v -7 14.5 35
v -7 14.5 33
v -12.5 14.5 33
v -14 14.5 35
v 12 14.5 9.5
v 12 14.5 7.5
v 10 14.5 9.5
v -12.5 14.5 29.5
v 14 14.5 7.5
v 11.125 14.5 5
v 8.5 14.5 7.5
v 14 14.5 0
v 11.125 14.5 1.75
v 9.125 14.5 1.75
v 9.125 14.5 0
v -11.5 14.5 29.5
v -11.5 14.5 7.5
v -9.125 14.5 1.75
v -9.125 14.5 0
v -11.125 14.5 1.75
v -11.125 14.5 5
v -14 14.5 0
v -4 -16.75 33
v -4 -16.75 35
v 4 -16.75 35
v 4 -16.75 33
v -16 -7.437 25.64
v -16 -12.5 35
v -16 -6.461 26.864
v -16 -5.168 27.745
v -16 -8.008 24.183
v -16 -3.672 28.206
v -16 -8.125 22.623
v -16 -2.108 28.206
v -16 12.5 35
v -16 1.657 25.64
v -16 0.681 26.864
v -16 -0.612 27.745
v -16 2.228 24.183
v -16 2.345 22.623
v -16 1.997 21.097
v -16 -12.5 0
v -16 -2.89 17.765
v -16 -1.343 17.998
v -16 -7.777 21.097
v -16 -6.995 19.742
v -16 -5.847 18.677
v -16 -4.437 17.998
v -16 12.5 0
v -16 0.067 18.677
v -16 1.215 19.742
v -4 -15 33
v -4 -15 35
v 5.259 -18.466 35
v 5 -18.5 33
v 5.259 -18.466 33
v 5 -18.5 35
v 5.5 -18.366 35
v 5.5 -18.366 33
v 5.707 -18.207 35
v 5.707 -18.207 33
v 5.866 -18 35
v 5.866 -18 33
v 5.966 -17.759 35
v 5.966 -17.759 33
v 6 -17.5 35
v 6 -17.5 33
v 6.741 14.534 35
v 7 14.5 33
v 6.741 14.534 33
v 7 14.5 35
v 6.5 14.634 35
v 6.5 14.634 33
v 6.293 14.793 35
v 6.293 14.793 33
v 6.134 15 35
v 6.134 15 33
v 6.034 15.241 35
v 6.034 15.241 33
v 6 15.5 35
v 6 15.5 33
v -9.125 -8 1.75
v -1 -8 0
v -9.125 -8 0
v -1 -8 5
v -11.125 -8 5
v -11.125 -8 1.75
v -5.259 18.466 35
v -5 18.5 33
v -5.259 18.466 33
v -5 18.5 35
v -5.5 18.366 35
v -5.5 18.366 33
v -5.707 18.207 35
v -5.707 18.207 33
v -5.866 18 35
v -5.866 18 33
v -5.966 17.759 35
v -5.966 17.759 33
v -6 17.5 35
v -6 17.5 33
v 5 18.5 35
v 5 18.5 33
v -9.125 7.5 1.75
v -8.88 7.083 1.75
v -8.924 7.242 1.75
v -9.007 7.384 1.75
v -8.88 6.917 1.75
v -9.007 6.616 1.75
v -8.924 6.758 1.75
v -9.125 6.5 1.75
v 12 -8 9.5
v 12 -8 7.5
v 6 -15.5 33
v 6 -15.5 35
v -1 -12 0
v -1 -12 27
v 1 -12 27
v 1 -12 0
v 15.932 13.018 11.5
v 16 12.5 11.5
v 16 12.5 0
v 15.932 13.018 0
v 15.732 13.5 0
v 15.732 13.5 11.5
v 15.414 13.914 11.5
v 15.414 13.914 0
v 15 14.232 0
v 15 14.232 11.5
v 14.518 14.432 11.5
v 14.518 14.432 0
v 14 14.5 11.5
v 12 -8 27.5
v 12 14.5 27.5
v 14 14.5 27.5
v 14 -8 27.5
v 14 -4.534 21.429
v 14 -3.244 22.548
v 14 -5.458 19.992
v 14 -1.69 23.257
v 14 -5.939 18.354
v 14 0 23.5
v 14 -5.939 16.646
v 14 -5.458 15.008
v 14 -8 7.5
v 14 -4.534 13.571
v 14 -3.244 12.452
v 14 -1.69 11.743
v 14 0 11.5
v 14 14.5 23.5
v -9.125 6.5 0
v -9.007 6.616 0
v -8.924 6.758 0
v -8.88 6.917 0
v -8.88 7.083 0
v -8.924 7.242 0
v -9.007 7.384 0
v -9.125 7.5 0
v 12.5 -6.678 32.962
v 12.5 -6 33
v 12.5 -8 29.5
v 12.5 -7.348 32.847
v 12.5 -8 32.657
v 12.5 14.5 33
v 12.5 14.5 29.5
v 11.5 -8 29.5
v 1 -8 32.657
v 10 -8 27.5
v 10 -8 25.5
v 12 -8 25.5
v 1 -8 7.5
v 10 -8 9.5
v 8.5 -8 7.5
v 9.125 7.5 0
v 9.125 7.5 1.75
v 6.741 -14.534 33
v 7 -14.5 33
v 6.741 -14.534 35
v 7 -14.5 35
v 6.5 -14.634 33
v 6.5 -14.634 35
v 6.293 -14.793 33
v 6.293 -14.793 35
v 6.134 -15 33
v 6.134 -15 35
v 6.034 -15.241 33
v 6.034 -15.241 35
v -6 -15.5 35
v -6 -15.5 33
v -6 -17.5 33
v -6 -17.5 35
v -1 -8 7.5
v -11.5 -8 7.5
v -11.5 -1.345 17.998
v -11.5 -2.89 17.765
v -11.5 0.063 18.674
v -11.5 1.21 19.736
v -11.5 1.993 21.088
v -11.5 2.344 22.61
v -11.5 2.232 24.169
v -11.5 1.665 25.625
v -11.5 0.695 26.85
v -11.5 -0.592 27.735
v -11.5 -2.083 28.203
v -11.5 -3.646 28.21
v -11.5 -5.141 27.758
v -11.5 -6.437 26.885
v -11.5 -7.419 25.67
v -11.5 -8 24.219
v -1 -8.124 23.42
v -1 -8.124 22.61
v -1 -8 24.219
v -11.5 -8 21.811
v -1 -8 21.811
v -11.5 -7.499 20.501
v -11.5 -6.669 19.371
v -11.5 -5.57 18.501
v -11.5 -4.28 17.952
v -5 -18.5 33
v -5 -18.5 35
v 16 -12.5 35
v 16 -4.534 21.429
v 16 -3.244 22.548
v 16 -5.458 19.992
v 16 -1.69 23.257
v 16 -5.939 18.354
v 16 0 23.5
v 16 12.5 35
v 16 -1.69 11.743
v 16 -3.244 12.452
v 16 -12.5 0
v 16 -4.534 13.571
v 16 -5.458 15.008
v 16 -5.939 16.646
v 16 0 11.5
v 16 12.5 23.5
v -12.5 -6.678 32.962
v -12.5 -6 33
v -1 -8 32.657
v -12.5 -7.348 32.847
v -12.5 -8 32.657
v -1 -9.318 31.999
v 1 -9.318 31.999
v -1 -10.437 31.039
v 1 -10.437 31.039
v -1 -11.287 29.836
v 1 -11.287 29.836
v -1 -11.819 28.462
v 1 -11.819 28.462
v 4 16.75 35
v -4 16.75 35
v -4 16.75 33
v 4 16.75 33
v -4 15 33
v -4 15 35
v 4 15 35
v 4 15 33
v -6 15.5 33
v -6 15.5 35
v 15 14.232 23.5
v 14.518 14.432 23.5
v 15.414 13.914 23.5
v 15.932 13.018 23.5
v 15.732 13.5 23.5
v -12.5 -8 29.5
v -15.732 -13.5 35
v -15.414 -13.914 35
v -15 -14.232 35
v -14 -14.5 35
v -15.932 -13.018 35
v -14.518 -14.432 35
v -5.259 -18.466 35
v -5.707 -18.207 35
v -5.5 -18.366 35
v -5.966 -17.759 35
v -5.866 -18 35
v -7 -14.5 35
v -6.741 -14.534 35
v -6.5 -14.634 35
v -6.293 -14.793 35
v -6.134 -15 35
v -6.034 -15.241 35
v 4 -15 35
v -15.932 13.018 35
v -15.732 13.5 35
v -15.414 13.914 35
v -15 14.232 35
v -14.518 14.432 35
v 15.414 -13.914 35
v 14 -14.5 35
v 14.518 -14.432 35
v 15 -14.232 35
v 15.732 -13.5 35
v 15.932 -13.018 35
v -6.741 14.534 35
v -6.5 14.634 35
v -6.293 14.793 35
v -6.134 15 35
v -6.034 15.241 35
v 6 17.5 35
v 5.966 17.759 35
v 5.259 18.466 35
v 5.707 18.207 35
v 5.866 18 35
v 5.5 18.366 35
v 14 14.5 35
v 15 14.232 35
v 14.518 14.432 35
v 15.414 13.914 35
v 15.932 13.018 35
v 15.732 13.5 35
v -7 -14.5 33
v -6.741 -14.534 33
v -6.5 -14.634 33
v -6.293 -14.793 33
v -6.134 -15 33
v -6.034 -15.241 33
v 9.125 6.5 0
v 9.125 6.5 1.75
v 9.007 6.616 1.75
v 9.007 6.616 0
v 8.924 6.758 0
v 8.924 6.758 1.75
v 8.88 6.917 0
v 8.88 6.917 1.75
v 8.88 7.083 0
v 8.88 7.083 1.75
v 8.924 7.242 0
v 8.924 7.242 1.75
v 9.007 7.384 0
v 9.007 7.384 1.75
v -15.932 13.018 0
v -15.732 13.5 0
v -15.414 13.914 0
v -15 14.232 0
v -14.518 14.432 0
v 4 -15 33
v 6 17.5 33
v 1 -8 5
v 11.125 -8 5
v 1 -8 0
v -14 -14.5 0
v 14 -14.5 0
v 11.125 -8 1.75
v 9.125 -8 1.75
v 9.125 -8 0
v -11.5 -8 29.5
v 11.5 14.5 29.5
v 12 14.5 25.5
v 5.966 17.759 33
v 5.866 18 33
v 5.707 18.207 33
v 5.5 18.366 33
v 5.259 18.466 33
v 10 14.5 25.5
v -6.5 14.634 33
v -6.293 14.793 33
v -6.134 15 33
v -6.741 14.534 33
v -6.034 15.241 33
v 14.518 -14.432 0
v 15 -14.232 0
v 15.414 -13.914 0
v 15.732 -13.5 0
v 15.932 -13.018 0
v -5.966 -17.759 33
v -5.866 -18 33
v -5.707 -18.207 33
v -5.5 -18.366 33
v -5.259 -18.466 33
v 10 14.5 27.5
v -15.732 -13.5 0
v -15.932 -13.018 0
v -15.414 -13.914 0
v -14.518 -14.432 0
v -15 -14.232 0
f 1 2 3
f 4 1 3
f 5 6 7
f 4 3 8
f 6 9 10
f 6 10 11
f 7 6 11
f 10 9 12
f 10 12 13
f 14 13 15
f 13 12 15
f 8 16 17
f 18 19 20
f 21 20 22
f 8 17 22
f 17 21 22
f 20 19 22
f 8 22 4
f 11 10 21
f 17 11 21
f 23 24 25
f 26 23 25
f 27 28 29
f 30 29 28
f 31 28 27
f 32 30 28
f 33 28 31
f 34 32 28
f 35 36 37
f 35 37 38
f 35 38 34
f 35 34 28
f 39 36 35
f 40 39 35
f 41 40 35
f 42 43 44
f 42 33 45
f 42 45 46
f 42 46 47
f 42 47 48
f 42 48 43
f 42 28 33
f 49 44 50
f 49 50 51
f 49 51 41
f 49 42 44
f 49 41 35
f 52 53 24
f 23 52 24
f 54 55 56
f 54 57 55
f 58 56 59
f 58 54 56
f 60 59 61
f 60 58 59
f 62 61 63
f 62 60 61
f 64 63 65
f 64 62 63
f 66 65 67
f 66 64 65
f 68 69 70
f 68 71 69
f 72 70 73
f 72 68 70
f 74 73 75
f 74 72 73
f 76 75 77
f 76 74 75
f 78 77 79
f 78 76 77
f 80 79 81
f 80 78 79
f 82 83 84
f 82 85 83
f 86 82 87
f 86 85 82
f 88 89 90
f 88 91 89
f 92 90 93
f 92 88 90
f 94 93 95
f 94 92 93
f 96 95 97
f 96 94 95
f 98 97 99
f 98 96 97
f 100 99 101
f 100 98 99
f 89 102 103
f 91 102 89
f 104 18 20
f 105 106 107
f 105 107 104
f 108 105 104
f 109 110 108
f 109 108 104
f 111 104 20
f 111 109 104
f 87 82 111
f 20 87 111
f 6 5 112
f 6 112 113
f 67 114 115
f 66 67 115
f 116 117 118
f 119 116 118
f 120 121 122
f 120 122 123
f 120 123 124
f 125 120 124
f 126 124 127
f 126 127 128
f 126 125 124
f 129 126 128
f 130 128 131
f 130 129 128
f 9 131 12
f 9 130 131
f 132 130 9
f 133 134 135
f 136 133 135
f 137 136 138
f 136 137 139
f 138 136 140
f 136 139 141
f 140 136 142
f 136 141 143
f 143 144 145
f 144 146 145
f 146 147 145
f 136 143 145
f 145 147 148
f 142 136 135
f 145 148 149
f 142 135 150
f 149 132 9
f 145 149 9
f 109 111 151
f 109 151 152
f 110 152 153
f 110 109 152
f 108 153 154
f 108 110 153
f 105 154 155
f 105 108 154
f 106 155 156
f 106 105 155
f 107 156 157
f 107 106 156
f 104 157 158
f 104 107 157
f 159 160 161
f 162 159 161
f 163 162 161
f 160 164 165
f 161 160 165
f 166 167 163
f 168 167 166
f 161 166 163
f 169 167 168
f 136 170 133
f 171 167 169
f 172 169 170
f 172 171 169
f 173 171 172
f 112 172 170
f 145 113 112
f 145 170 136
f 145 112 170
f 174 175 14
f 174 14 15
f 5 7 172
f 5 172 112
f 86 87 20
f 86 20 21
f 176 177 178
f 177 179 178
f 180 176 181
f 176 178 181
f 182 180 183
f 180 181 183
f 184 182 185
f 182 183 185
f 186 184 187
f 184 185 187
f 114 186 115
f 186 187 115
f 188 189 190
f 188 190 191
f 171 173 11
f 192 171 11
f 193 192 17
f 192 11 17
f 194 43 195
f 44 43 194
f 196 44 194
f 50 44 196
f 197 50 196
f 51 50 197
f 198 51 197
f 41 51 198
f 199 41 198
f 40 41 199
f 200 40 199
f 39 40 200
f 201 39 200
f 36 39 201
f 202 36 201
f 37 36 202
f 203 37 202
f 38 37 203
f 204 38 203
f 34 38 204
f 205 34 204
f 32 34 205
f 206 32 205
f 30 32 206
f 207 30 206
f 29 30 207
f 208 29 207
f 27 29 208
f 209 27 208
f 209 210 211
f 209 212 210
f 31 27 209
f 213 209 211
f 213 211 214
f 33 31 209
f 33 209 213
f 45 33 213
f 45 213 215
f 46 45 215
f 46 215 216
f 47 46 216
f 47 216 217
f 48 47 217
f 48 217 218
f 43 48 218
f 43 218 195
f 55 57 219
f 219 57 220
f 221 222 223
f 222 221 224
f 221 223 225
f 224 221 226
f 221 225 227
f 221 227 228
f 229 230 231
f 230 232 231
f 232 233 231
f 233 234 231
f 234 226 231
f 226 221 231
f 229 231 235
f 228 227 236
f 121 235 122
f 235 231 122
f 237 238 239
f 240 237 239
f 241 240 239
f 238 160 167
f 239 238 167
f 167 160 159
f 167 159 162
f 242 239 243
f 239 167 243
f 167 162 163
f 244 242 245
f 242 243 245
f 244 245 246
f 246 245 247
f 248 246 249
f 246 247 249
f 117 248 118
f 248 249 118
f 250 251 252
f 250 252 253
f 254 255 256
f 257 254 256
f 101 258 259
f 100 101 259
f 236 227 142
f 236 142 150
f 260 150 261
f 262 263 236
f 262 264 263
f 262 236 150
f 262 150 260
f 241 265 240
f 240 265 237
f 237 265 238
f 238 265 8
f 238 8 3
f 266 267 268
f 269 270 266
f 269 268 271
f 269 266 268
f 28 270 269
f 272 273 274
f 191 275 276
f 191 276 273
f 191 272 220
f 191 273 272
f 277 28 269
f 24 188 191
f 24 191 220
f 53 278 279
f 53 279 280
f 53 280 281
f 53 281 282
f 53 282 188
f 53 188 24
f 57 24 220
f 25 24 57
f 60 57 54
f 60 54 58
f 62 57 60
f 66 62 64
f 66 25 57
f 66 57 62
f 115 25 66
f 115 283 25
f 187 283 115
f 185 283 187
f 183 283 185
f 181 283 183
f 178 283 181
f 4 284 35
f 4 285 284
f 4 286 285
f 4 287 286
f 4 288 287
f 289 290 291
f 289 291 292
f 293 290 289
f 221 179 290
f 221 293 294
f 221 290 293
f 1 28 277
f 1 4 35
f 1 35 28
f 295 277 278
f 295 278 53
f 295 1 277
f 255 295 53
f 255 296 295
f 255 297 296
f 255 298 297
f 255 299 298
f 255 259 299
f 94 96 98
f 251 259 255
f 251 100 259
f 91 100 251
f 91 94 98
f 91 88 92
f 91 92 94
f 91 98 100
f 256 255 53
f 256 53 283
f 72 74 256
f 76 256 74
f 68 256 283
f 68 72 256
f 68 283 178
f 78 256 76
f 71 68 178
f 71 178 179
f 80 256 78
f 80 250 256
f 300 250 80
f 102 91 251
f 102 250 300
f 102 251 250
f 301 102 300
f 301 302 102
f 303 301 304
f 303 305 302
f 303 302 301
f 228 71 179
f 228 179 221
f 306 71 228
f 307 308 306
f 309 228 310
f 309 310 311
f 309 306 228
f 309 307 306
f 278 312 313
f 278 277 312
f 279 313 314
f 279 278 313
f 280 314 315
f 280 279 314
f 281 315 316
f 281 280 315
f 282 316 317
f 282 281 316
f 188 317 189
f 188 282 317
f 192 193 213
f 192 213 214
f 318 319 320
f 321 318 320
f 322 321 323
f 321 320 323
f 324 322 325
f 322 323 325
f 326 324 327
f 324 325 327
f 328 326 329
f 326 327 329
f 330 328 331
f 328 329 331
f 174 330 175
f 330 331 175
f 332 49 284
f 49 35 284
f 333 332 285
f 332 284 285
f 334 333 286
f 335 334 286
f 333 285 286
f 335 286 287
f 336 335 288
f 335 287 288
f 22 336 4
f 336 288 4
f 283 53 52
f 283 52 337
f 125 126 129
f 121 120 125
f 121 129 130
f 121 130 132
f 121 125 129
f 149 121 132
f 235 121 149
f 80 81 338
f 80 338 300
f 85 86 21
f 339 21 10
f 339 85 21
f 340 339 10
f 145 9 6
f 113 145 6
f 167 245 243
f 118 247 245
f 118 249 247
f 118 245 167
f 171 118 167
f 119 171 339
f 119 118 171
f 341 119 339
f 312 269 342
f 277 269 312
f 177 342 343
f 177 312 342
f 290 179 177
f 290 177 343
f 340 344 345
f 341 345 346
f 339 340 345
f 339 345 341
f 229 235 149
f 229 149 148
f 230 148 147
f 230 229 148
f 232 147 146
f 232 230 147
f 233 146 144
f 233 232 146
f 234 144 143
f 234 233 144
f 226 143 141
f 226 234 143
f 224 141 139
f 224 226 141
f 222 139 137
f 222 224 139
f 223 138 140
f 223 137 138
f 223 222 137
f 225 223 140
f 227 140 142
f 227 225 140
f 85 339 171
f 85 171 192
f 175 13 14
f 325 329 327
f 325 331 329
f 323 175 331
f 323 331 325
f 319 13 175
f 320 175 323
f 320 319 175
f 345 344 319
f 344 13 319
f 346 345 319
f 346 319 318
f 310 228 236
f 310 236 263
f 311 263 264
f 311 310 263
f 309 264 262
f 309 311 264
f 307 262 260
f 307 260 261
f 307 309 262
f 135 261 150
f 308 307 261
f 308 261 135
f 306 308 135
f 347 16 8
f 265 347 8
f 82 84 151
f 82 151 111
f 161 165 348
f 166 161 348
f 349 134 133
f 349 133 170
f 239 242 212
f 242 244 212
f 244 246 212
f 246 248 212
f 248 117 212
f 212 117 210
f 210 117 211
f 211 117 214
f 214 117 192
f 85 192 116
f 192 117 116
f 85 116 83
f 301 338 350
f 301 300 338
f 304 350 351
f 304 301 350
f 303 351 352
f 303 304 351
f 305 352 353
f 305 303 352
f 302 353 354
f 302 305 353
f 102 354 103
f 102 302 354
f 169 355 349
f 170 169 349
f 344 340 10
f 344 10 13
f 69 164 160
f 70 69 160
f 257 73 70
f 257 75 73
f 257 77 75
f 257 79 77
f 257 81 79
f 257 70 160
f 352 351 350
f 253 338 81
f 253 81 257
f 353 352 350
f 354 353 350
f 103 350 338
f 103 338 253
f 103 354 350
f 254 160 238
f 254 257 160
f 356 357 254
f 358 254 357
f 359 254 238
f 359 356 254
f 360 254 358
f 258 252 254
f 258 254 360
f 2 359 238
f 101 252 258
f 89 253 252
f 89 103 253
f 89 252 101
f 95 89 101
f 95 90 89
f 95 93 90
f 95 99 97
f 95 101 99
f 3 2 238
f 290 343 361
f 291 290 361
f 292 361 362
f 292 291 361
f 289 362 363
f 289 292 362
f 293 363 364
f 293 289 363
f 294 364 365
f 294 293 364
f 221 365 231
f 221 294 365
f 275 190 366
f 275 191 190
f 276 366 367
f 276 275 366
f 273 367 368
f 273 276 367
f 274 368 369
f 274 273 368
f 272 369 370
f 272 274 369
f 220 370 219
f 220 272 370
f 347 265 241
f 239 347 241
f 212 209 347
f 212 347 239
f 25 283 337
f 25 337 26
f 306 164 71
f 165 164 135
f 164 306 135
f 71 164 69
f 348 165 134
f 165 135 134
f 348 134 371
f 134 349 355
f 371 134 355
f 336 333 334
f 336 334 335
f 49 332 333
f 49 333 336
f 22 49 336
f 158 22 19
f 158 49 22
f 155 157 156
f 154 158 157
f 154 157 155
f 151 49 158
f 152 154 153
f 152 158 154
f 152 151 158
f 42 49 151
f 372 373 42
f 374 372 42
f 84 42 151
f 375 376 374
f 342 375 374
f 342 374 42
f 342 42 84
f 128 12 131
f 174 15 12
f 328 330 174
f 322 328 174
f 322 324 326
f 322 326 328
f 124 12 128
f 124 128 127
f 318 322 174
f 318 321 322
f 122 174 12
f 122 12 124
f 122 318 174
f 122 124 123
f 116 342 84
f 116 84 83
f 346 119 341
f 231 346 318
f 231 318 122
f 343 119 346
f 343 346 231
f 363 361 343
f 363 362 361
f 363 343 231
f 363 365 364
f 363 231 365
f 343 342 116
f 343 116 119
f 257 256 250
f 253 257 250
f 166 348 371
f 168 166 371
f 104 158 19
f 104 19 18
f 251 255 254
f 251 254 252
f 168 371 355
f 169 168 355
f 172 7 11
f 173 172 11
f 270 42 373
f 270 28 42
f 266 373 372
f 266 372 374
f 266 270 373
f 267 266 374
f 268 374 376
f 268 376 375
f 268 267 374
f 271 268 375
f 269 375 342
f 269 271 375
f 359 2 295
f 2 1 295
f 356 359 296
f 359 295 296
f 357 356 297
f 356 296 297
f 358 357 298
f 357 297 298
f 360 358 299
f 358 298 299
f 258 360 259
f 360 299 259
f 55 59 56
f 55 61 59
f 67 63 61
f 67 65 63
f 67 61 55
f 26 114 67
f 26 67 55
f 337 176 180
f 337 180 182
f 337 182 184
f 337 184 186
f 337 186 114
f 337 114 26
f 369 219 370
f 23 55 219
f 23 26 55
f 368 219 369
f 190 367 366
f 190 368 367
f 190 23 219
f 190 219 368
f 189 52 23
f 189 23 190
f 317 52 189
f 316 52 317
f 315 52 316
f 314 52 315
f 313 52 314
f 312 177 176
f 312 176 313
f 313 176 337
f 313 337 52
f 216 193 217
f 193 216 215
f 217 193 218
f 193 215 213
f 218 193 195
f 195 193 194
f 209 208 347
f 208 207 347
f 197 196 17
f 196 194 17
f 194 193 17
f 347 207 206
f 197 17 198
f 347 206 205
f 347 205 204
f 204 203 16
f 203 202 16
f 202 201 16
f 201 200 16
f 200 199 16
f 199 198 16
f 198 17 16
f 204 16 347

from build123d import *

# Parameters (mm, degrees)
SKETCH1_W                         = 32
SKETCH1_H                         = 29
BOSS_EXTRUDE1_DEPTH               = 35
FILLET1_R                         = 2
SLOT_FOR_COIL_DEPTH               = 1
SLOT_FOR_COIL_DEPTH_BACK          = 30
BOSS_EXTRUDE2_DEPTH               = 6.5
BOSS_EXTRUDE3_DEPTH               = 1.75
SKETCH5_W                         = 2
SKETCH5_H                         = 6.5
SLOT_TO_FEED_IN_WIRE_DEPTH        = 33
SLOT_FO_PCB_DEPTH                 = 22.5
SKETCH7_W                         = 2
SKETCH7_H                         = 33
BOSS_EXTRUDE4_DEPTH               = 2.5
FILLET2_R                         = 6
ROD_MOUNT_SLOT_REACH              = 34
SKETCH14_W                        = 2.5
SKETCH14_H                        = 20
SIDE_CAVITY_FOR_MOUNT_PLATE_DEPTH = 22.5
SKETCH16_W                        = 2
SKETCH16_H                        = 2
SIDE_STOPS_FOR_MOUNT_PLATE_DEPTH  = 22.5
BOSS_EXTRUDE6_DEPTH               = 22.5
SKETCH21_W                        = 12
SKETCH21_H                        = 2
BOSS_EXTRUDE7_DEPTH               = 4
SKETCH23_W                        = 8
SKETCH23_H                        = 1.75
CUT_EXTRUDE7_DEPTH                = 2
FILLET3_R                         = 1
CUT_EXTRUDE8_REACH                = 34
SKETCH26_R                        = 5.25


with BuildPart() as part:
    # Sketch1 → Boss-Extrude1 (new body)
    with BuildSketch(Plane.XY):
        Rectangle(SKETCH1_W, SKETCH1_H)
    extrude(amount=BOSS_EXTRUDE1_DEPTH)

    # Fillet1
    fillet1_edges = [part.edges().sort_by_distance(p)[0] for p in [
        (16, -14.5, 17.5),
        (-16, -14.5, 17.5),
        (-16, 14.5, 17.5),
        (16, 14.5, 17.5),
    ]]
    fillet(fillet1_edges, radius=FILLET1_R)

    # Sketch2 → Slot for Coil (cut, two sides)
    with BuildSketch(Plane.XZ.offset(14.5)) as slot_for_coil_sk:
        Polygon((-9.125, 0), (-9.125, 1.75), (-11.125, 1.75), (-11.125, 5), (11.125, 5), (11.125, 1.75), (9.125, 1.75), (9.125, 0), align=None)
    extrude(amount=SLOT_FOR_COIL_DEPTH, mode=Mode.SUBTRACT)
    extrude(slot_for_coil_sk.sketch, amount=-SLOT_FOR_COIL_DEPTH_BACK, mode=Mode.SUBTRACT)

    # Sketch3 → Boss-Extrude2 (add)
    with BuildSketch(Plane.XZ.offset(14.5)):
        Polygon((-9.125, 0), (-9.125, 1.75), (-11.125, 1.75), (-11.125, 5), (11.125, 5), (11.125, 1.75), (9.125, 1.75), (9.125, 0), align=None)
    extrude(amount=-BOSS_EXTRUDE2_DEPTH)

    # Sketch4 → Boss-Extrude3 (add)
    with BuildSketch(Plane(origin=(0, 0, 1.75), x_dir=(-1, 0, 0), z_dir=(0, 0, -1))):
        with BuildLine():
            Line((-9.125, 7.5), (-9.125, 6.5))
            ThreePointArc((-9.125, 6.5), (-8.875, 7), (-9.125, 7.5))
        make_face()
    boss_extrude3 = extrude(amount=BOSS_EXTRUDE3_DEPTH)

    # Mirror1: Boss-Extrude3 across plane
    add(boss_extrude3.mirror(Plane(origin=(0, 0, 0), x_dir=(0, 0, 1), z_dir=(1, 0, 0))))

    # Sketch5 → slot to feed in wire (cut)
    with BuildSketch(Plane(origin=(0, 0, 0), x_dir=(-1, 0, 0), z_dir=(0, 0, -1))):
        with Locations((0, -11.25)):
            Rectangle(SKETCH5_W, SKETCH5_H)
    extrude(amount=-SLOT_TO_FEED_IN_WIRE_DEPTH, mode=Mode.SUBTRACT)

    # Sketch6 → slot fo PCB (cut)
    with BuildSketch(Plane(origin=(0, 14.5, 0), x_dir=(1, 0, 0), z_dir=(0, 1, 0))):
        Polygon((11.5, -7.5), (-11.5, -7.5), (-11.5, -29.5), (-12.5, -29.5), (-12.5, -33), (12.5, -33), (12.5, -29.5), (11.5, -29.5), align=None)
    extrude(amount=-SLOT_FO_PCB_DEPTH, mode=Mode.SUBTRACT)

    # Sketch7 → Boss-Extrude4 (add)
    with BuildSketch(Plane.XZ.offset(14.5)):
        with Locations((0, 16.5)):
            Rectangle(SKETCH7_W, SKETCH7_H)
    extrude(amount=-BOSS_EXTRUDE4_DEPTH)

    # Fillet2
    fillet2_edges = [part.edges().sort_by_distance(p)[0] for p in [
        (0, -12, 33),
    ]]
    fillet(fillet2_edges, radius=FILLET2_R)

    # Sketch11 → Rod Mount Slot (cut, up to next)
    with BuildSketch(Plane(origin=(16, 0, 44), x_dir=(0, 0, -1), z_dir=(1, 0, 0)), mode=Mode.PRIVATE) as rod_mount_slot_sk1:
        with BuildLine():
            Line((32.5, 25), (32.5, 0))
            ThreePointArc((32.5, 0), (26.5, -6), (20.5, 0))
            Line((20.5, 0), (20.5, 25))
            ThreePointArc((20.5, 25), (26.5, 31), (32.5, 25))
        make_face()
    rod_mount_slot_tool1 = extrude(rod_mount_slot_sk1.sketch, amount=-ROD_MOUNT_SLOT_REACH, mode=Mode.PRIVATE) & part.part
    add(rod_mount_slot_tool1.solids().sort_by_distance((16, 12.5, 17.5))[0], mode=Mode.SUBTRACT)

    # Sketch14 → Side cavity for mount plate (cut)
    with BuildSketch(Plane(origin=(0, 14.5, 0), x_dir=(1, 0, 0), z_dir=(0, 1, 0))):
        with Locations((12.75, -17.5)):
            Rectangle(SKETCH14_W, SKETCH14_H)
    extrude(amount=-SIDE_CAVITY_FOR_MOUNT_PLATE_DEPTH, mode=Mode.SUBTRACT)

    # Sketch16 → Side stops for mount plate (add)
    with BuildSketch(Plane(origin=(0, 14.5, 0), x_dir=(1, 0, 0), z_dir=(0, 1, 0))):
        with Locations((11, -8.5)):
            Rectangle(SKETCH16_W, SKETCH16_H)
        with Locations((11, -26.5)):
            Rectangle(SKETCH16_W, SKETCH16_H)
    extrude(amount=-SIDE_STOPS_FOR_MOUNT_PLATE_DEPTH)

    # Sketch20 → Boss-Extrude6 (add)
    with BuildSketch(Plane(origin=(0, 14.5, 0), x_dir=(1, 0, 0), z_dir=(0, 1, 0))):
        Polygon((11.5, -29.5), (10, -27.5), (11.5, -27.5), align=None)
        Polygon((10, -9.5), (8.5, -7.5), (10, -7.5), align=None)
    extrude(amount=-BOSS_EXTRUDE6_DEPTH)

    # Sketch21 → Boss-Extrude7 (add)
    with BuildSketch(Plane(origin=(0, 14.5, 0), x_dir=(-1, 0, 0), z_dir=(0, 1, 0))):
        with Locations((0, 34)):
            Rectangle(SKETCH21_W, SKETCH21_H)
    boss_extrude7 = extrude(amount=BOSS_EXTRUDE7_DEPTH)

    # Sketch23 → Cut-Extrude7 (cut)
    with BuildSketch(Plane.XY.offset(35)):
        with Locations((0, 15.875)):
            Rectangle(SKETCH23_W, SKETCH23_H)
    cut_extrude7 = extrude(amount=-CUT_EXTRUDE7_DEPTH, mode=Mode.SUBTRACT)

    # Mirror3: Boss-Extrude7, Cut-Extrude7 across plane
    add(boss_extrude7.mirror(Plane.ZX))
    add(cut_extrude7.mirror(Plane.ZX), mode=Mode.SUBTRACT)

    # Fillet3
    fillet3_edges = [part.edges().sort_by_distance(p)[0] for p in [
        (6, 14.5, 34),
        (-6, 14.5, 34),
        (6, 18.5, 34),
        (-6, 18.5, 34),
        (6, -18.5, 34),
        (-6, -18.5, 34),
        (6, -14.5, 34),
        (-6, -14.5, 34),
    ]]
    fillet(fillet3_edges, radius=FILLET3_R)

    # Sketch26 → Cut-Extrude8 (cut, up to next)
    with BuildSketch(Plane(origin=(-16, 0, 0), x_dir=(0, 0, -1), z_dir=(1, 0, 0)), mode=Mode.PRIVATE) as cut_extrude8_sk1:
        with Locations((-23.015, -2.89)):
            Circle(SKETCH26_R)
    cut_extrude8_tool1 = extrude(cut_extrude8_sk1.sketch, amount=CUT_EXTRUDE8_REACH, mode=Mode.PRIVATE) & part.part
    add(cut_extrude8_tool1.solids().sort_by_distance((-16, -2.89, 23.015))[0], mode=Mode.SUBTRACT)


solid = part.part
